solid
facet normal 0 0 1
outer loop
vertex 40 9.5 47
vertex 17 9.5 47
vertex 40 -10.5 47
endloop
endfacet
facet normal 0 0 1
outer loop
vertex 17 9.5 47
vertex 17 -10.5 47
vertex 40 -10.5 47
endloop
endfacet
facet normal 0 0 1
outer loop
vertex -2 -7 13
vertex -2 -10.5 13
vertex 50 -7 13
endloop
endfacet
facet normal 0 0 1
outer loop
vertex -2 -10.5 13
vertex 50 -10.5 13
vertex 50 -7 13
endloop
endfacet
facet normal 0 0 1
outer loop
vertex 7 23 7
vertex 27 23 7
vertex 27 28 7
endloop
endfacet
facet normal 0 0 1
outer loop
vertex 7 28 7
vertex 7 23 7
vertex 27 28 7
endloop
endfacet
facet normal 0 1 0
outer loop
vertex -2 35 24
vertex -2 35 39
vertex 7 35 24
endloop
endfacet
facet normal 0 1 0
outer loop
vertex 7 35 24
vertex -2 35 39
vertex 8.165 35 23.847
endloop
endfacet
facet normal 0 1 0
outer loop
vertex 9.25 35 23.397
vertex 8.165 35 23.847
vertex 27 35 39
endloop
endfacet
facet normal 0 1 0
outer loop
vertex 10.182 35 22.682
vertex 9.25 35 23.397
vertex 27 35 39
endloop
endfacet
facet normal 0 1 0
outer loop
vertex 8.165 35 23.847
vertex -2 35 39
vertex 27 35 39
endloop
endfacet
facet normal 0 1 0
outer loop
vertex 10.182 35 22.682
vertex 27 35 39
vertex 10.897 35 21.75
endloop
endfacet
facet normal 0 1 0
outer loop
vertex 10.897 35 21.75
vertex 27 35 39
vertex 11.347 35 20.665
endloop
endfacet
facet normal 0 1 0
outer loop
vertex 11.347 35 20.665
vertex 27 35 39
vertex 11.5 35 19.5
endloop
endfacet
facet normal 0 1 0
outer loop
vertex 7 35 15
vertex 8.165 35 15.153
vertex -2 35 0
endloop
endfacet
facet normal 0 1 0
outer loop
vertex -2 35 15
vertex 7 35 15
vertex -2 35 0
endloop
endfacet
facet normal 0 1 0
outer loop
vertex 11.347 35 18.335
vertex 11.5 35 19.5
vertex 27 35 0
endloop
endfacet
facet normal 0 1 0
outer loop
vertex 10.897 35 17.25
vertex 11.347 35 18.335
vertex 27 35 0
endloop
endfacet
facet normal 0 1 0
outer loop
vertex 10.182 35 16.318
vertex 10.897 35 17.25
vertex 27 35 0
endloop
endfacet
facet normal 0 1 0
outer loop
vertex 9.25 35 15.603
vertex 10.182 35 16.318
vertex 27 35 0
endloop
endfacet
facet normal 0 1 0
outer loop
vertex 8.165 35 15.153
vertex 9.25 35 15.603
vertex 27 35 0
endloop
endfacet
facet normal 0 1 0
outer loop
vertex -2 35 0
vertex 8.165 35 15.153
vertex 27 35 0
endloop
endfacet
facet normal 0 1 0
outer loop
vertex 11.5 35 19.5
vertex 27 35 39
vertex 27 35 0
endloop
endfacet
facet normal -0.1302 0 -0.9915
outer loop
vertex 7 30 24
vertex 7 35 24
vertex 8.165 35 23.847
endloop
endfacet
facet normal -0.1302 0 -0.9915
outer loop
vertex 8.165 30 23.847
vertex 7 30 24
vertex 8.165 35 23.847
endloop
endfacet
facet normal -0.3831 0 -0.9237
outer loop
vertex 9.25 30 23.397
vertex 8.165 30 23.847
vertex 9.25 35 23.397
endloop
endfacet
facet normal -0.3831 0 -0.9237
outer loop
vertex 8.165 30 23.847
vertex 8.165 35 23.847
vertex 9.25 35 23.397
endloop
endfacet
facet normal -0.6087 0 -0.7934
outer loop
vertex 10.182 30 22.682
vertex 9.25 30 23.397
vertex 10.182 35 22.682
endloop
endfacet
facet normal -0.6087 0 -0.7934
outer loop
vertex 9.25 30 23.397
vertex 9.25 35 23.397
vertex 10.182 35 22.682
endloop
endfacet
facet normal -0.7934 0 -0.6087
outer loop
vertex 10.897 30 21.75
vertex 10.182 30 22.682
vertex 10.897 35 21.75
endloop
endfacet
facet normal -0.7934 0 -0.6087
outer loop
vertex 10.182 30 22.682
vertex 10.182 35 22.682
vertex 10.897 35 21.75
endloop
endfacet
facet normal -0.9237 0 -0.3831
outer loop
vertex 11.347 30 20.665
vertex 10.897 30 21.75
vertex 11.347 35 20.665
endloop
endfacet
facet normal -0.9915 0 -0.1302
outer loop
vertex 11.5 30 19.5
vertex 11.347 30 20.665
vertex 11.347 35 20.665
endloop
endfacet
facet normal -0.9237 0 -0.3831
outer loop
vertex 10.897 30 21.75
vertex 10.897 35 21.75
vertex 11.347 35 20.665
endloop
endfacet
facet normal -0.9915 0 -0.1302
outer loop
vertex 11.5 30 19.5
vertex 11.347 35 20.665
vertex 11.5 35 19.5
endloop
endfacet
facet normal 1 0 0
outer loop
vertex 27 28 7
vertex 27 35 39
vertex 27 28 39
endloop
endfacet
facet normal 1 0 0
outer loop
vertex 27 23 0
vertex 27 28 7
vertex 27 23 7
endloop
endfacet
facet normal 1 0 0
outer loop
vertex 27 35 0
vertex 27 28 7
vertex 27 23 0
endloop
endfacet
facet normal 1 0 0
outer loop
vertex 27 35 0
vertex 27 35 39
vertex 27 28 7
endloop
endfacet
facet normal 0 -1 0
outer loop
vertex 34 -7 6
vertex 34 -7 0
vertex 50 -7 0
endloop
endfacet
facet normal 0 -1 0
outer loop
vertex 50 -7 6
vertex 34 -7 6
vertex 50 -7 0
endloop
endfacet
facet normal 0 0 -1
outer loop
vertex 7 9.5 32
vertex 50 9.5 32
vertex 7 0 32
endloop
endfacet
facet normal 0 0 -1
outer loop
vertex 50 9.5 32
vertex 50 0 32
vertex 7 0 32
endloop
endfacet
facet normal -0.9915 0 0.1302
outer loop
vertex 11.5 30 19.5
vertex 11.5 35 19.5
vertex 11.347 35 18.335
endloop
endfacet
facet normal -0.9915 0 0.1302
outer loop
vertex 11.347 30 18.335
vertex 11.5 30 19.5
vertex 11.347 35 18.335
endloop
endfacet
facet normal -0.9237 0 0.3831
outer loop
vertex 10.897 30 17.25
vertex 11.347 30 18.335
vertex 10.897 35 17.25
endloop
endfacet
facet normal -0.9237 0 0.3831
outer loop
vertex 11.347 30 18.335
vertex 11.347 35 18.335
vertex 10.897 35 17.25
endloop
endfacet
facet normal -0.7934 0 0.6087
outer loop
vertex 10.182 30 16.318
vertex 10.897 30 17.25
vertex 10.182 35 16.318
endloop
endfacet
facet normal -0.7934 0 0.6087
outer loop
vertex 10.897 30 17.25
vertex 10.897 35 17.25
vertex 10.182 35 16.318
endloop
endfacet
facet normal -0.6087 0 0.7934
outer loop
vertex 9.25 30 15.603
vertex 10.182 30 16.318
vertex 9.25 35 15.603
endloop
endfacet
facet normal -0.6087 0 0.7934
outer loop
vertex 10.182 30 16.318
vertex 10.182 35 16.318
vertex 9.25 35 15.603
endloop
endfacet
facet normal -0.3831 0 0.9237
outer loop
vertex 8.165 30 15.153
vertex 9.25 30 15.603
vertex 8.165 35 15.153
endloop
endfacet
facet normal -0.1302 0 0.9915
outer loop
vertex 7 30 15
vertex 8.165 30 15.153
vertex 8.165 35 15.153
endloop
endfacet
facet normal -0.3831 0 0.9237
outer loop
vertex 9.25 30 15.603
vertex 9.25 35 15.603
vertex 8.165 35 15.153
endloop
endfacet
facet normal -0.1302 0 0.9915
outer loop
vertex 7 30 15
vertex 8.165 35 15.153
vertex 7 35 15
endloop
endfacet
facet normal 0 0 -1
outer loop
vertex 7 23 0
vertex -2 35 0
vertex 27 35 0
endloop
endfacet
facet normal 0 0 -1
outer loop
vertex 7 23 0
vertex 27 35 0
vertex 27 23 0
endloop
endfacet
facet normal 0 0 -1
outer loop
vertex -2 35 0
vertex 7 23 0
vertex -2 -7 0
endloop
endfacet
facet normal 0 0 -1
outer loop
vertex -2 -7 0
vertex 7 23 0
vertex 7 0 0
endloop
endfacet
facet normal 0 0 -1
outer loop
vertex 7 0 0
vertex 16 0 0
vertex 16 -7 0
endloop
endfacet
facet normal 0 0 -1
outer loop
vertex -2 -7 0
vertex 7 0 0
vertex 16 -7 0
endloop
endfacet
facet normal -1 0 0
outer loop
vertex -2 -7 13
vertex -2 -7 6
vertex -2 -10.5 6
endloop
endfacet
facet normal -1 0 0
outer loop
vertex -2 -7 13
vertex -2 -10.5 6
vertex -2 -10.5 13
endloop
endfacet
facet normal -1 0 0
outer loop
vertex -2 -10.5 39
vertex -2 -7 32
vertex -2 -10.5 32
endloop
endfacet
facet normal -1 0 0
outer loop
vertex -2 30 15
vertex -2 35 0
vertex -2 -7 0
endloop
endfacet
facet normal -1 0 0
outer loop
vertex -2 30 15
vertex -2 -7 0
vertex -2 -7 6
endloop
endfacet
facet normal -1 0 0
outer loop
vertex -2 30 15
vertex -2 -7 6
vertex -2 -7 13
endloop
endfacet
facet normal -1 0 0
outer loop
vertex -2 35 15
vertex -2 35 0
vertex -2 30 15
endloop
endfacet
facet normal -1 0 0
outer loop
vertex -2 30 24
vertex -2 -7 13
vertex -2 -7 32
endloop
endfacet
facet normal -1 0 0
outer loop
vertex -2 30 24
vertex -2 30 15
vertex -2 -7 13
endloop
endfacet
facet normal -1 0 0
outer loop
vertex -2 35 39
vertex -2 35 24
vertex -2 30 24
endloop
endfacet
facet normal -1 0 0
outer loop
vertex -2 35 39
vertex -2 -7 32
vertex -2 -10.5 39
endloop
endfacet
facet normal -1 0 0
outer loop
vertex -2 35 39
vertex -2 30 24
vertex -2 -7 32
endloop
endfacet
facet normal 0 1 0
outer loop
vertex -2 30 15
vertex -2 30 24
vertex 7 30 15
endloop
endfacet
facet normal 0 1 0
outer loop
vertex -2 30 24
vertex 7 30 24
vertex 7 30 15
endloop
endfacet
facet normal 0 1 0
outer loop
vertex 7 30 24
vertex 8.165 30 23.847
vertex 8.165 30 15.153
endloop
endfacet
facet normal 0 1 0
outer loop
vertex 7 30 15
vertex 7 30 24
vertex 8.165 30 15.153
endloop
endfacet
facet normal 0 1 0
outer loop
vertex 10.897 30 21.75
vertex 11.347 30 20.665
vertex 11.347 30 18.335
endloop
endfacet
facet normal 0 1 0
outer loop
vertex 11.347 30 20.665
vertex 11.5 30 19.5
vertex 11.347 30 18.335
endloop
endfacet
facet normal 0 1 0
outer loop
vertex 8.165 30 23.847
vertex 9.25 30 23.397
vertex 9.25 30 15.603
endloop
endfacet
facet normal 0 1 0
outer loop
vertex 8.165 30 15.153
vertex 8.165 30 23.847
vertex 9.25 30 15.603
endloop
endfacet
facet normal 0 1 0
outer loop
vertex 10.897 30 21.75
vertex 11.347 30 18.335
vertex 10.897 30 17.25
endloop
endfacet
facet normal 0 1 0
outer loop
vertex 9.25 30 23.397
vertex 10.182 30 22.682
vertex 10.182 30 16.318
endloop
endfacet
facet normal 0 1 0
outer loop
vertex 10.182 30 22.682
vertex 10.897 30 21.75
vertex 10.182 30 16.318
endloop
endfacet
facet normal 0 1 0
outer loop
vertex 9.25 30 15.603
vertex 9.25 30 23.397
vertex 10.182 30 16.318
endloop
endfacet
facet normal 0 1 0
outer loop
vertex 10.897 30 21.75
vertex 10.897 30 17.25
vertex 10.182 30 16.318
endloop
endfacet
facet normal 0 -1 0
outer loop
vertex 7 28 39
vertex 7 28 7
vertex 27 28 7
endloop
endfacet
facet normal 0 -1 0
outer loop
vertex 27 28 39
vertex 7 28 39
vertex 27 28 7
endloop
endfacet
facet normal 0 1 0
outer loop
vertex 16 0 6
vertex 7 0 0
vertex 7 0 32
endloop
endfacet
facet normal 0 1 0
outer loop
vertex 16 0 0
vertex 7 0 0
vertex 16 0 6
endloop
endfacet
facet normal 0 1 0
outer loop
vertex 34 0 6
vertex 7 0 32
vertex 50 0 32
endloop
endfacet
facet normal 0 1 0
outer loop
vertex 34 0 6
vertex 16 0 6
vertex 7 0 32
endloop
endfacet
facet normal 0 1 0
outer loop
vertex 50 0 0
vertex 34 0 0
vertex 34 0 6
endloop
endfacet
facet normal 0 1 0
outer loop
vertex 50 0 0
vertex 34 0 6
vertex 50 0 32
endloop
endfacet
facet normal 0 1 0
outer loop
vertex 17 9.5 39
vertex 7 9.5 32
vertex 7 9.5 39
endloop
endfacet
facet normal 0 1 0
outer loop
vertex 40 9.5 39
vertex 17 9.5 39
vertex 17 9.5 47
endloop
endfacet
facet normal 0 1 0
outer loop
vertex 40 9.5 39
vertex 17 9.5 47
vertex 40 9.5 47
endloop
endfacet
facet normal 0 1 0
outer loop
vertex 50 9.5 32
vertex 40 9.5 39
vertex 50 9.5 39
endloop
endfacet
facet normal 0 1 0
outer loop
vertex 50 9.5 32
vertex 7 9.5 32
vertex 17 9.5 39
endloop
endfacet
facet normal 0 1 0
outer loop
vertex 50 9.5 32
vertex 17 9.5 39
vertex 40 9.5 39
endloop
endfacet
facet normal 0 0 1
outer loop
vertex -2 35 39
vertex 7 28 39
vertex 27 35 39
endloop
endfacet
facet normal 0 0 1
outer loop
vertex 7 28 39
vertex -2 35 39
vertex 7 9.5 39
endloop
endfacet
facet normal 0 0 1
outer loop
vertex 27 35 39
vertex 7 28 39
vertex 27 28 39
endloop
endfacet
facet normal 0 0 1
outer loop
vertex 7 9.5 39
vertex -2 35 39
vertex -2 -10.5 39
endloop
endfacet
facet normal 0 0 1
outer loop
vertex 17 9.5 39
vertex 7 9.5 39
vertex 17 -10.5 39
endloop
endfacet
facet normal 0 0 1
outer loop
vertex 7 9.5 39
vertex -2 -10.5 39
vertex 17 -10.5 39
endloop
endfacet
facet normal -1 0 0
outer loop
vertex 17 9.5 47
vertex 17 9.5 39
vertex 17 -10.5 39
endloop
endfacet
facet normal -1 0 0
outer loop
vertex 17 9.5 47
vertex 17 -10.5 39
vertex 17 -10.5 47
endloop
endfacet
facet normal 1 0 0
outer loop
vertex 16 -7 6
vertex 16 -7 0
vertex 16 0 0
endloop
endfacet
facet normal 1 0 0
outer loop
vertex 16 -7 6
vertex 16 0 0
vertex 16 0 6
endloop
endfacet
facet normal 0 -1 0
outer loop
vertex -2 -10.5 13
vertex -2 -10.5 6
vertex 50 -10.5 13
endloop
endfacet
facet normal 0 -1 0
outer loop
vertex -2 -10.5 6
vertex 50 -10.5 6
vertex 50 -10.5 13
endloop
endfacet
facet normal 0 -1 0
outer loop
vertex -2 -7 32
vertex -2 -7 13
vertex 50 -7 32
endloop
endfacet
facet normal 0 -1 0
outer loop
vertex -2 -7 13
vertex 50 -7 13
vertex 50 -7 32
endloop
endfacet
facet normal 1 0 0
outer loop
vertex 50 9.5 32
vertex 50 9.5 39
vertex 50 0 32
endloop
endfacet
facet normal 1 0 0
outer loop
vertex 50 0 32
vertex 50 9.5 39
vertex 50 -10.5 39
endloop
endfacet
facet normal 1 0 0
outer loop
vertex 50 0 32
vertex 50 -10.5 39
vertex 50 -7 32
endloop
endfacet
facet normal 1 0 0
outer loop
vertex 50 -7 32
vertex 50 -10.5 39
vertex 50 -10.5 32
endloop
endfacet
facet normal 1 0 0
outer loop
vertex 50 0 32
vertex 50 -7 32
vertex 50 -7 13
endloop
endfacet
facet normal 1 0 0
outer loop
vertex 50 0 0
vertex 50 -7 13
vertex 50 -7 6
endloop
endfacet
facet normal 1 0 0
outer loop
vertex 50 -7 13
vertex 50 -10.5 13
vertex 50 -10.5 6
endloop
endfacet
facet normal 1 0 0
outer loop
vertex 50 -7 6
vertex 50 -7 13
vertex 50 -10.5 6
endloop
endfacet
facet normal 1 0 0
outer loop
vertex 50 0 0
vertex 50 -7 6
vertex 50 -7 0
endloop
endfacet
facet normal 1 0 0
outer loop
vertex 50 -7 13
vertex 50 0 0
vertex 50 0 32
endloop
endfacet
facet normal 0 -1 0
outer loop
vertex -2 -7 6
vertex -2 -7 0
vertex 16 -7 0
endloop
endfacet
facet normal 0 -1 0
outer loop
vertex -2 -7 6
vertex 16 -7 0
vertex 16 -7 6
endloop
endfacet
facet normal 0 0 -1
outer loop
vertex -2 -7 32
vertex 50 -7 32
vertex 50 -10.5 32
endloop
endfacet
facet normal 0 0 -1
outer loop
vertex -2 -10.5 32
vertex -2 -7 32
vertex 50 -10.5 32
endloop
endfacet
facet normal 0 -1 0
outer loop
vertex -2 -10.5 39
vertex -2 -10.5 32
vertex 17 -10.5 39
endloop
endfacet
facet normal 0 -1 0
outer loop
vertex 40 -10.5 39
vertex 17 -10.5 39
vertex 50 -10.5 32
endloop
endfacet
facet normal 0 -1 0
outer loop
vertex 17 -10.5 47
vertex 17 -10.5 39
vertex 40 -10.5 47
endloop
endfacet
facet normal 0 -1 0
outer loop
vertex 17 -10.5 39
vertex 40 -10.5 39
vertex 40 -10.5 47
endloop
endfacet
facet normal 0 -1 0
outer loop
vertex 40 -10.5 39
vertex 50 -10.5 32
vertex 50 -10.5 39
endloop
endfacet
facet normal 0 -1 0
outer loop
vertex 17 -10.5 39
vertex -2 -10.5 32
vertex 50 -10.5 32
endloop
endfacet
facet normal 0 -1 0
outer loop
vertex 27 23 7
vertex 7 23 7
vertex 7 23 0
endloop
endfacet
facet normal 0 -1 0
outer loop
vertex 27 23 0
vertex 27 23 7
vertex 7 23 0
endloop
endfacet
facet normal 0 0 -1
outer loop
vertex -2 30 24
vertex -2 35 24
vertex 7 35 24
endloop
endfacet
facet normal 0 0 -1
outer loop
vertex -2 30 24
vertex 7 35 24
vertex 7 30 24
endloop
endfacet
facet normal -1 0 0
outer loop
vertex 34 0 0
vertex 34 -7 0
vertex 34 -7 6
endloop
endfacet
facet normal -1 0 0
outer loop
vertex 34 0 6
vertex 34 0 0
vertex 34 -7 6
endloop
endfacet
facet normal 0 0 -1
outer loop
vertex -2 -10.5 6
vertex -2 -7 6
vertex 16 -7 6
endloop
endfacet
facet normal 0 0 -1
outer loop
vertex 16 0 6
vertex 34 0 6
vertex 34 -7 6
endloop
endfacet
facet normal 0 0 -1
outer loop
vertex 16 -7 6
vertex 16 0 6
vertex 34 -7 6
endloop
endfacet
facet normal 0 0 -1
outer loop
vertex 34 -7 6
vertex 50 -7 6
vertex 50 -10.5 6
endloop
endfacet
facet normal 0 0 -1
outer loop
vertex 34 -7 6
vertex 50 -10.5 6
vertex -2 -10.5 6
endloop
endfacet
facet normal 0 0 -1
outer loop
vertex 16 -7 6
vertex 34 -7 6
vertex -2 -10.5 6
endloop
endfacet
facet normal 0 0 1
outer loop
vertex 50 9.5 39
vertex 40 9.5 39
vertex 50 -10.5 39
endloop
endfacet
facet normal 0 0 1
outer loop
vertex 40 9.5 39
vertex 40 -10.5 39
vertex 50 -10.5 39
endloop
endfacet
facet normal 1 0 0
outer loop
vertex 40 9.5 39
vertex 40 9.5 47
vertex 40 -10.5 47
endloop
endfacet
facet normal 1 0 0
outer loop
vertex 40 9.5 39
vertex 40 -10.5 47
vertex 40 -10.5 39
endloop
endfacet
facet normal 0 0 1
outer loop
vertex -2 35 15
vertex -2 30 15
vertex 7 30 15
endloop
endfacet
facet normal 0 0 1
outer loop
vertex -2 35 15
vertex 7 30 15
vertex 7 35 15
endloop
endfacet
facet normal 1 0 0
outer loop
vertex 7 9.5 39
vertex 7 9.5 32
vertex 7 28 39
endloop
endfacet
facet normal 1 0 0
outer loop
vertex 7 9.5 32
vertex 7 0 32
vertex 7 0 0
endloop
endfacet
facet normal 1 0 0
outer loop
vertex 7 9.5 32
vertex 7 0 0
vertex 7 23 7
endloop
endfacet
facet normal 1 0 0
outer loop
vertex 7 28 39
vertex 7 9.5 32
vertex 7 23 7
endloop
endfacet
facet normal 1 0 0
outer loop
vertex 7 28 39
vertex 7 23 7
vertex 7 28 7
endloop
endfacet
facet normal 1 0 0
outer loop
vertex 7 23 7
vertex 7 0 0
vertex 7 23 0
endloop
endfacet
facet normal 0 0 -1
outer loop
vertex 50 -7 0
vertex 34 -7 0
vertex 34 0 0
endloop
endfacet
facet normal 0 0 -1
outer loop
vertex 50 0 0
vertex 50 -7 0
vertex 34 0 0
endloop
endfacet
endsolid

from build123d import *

# Parameters (mm, degrees)
SKETCH_1_W          = 20
SKETCH_1_H          = 7
SKETCH_1_W_2        = 50
EXTRUDE_1_DEPTH     = 39
CUT_EXTRUDE_1_DEPTH = 5
EXTRUDE_2_REACH     = 60.949
SKETCH_3_W          = 7
SKETCH_3_H          = 5
EXTRUDE_3_REACH     = 74.429
SKETCH_4_W          = 7
SKETCH_4_H          = 14
SKETCH_4_H_2        = 3.5
CUT_EXTRUDE_2_REACH = 78.059
SKETCH_5_W          = 18
SKETCH_5_H          = 6
SKETCH_6_W          = 23
SKETCH_6_H          = 14
EXTRUDE_4_DEPTH     = 8
EXTRUDE_5_DEPTH     = 2
EXTRUDE_6_DEPTH     = 6


with BuildPart() as part:
    # Эскиз1 → Бобышка-Вытянуть1 (new body)
    with BuildSketch(Plane.XY):
        with Locations((17, 31.5)):
            Rectangle(SKETCH_1_W, SKETCH_1_H)
        Polygon((0, 35), (0, 0), (7, 0), (7, 28), (7, 35), align=None)
        with Locations((25, -3.5)):
            Rectangle(SKETCH_1_W_2, SKETCH_1_H)
    extrude(amount=EXTRUDE_1_DEPTH)

    # Эскиз2 → Вырез-Вытянуть1 (cut)
    with BuildSketch(Plane(origin=(0, 35, 0), x_dir=(1, 0, 0), z_dir=(0, 1, 0))):
        with BuildLine():
            ThreePointArc((7, -15), (3.818019485, -16.318019485), (2.5, -19.5))
            Line((2.5, -19.5), (11.5, -19.5))
            ThreePointArc((11.5, -19.5), (10.181980515, -16.318019485), (7, -15))
        make_face()
        with BuildLine():
            Line((11.5, -19.5), (2.5, -19.5))
            ThreePointArc((2.5, -19.5), (3.818019485, -22.681980515), (7, -24))
            ThreePointArc((7, -24), (10.181980515, -22.681980515), (11.5, -19.5))
        make_face()
        with BuildLine():
            Line((0, -15), (0, -19.5))
            Line((0, -19.5), (2.5, -19.5))
            ThreePointArc((2.5, -19.5), (3.818019485, -16.318019485), (7, -15))
            Line((7, -15), (0, -15))
        make_face()
        with BuildLine():
            Line((2.5, -19.5), (0, -19.5))
            Line((0, -19.5), (0, -24))
            Line((0, -24), (7, -24))
            ThreePointArc((7, -24), (3.818019485, -22.681980515), (2.5, -19.5))
        make_face()
    extrude(amount=-CUT_EXTRUDE_1_DEPTH, mode=Mode.SUBTRACT)

    # Эскиз3 → Бобышка-Вытянуть2 (add, up to next)
    with BuildSketch(Plane(origin=(27, 0, 0), x_dir=(0, 0, -1), z_dir=(1, 0, 0)), mode=Mode.PRIVATE) as extrude_2_sk1:
        with Locations((-3.5, 25.5)):
            Rectangle(SKETCH_3_W, SKETCH_3_H)
    extrude_2_tool1 = extrude(extrude_2_sk1.sketch, amount=-EXTRUDE_2_REACH, mode=Mode.PRIVATE) - part.part
    add(extrude_2_tool1.solids().sort_by_distance((27, 25.5, 3.5))[0])

    # Бобышка-Вытянуть3: up to this face of the body (flat: up to its plane)
    extrude_3_end = Plane(part.part.faces().sort_by_distance((0, 13.47740113, 19.5))[0])
    # Эскиз4 → Бобышка-Вытянуть3 (add, up to the picked face)
    with BuildSketch(Plane(origin=(50, 0, 0), x_dir=(0, 0, -1), z_dir=(1, 0, 0)), mode=Mode.PRIVATE) as extrude_3_sk1:
        with Locations((-35.5, -3.5)):
            Rectangle(SKETCH_4_W, SKETCH_4_H)
    extrude_3_tool1 = split(extrude(extrude_3_sk1.sketch, amount=-EXTRUDE_3_REACH, mode=Mode.PRIVATE), bisect_by=extrude_3_end, keep=Keep.BOTH, mode=Mode.PRIVATE)
    # Эскиз4 → Бобышка-Вытянуть3 (add, up to the picked face)
    with BuildSketch(Plane(origin=(50, 0, 0), x_dir=(0, 0, -1), z_dir=(1, 0, 0)), mode=Mode.PRIVATE) as extrude_3_sk2:
        with Locations((-9.5, -8.75)):
            Rectangle(SKETCH_4_W, SKETCH_4_H_2)
    extrude_3_tool2 = split(extrude(extrude_3_sk2.sketch, amount=-EXTRUDE_3_REACH, mode=Mode.PRIVATE), bisect_by=extrude_3_end, keep=Keep.BOTH, mode=Mode.PRIVATE)
    add(extrude_3_tool1.solids().sort_by(Axis((50, -3.5, 35.5), (-1, 0, 0)))[0])
    add(extrude_3_tool2.solids().sort_by(Axis((50, -8.75, 9.5), (-1, 0, 0)))[0])

    # Эскиз5 → Вырез-Вытянуть2 (cut, up to next)
    with BuildSketch(Plane.XZ.offset(7), mode=Mode.PRIVATE) as cut_extrude_2_sk1:
        with Locations((25, 3)):
            Rectangle(SKETCH_5_W, SKETCH_5_H)
    cut_extrude_2_tool1 = extrude(cut_extrude_2_sk1.sketch, amount=-CUT_EXTRUDE_2_REACH, mode=Mode.PRIVATE) & part.part
    add(cut_extrude_2_tool1.solids().sort_by_distance((25, -7, 3))[0], mode=Mode.SUBTRACT)

    # Эскиз6 → Бобышка-Вытянуть4 (add)
    with BuildSketch(Plane.XY.offset(39)):
        with Locations((28.5, -3.5)):
            Rectangle(SKETCH_6_W, SKETCH_6_H)
    extrude(amount=EXTRUDE_4_DEPTH)

    # Эскиз7 → Бобышка-Вытянуть5 (add)
    with BuildSketch(Plane.ZY):
        Polygon((39, -10.5), (39, 35), (24, 35), (24, 30), (15, 30), (15, 35), (0, 35), (0, -7), (6, -7), (6, -10.5), (13, -10.5), (13, -7), (32, -7), (32, -10.5), align=None)
    extrude(amount=EXTRUDE_5_DEPTH)

    # Эскиз8 → Бобышка-Вытянуть6 (add)
    with BuildSketch(Plane(origin=(0, 3.5, 0), x_dir=(1, 0, 0), z_dir=(0, 1, 0))):
        Polygon((7, -32), (7, -39), (17, -39), (17, -47), (40, -47), (40, -39), (50, -39), (50, -32), align=None)
    extrude(amount=EXTRUDE_6_DEPTH)


solid = part.part
